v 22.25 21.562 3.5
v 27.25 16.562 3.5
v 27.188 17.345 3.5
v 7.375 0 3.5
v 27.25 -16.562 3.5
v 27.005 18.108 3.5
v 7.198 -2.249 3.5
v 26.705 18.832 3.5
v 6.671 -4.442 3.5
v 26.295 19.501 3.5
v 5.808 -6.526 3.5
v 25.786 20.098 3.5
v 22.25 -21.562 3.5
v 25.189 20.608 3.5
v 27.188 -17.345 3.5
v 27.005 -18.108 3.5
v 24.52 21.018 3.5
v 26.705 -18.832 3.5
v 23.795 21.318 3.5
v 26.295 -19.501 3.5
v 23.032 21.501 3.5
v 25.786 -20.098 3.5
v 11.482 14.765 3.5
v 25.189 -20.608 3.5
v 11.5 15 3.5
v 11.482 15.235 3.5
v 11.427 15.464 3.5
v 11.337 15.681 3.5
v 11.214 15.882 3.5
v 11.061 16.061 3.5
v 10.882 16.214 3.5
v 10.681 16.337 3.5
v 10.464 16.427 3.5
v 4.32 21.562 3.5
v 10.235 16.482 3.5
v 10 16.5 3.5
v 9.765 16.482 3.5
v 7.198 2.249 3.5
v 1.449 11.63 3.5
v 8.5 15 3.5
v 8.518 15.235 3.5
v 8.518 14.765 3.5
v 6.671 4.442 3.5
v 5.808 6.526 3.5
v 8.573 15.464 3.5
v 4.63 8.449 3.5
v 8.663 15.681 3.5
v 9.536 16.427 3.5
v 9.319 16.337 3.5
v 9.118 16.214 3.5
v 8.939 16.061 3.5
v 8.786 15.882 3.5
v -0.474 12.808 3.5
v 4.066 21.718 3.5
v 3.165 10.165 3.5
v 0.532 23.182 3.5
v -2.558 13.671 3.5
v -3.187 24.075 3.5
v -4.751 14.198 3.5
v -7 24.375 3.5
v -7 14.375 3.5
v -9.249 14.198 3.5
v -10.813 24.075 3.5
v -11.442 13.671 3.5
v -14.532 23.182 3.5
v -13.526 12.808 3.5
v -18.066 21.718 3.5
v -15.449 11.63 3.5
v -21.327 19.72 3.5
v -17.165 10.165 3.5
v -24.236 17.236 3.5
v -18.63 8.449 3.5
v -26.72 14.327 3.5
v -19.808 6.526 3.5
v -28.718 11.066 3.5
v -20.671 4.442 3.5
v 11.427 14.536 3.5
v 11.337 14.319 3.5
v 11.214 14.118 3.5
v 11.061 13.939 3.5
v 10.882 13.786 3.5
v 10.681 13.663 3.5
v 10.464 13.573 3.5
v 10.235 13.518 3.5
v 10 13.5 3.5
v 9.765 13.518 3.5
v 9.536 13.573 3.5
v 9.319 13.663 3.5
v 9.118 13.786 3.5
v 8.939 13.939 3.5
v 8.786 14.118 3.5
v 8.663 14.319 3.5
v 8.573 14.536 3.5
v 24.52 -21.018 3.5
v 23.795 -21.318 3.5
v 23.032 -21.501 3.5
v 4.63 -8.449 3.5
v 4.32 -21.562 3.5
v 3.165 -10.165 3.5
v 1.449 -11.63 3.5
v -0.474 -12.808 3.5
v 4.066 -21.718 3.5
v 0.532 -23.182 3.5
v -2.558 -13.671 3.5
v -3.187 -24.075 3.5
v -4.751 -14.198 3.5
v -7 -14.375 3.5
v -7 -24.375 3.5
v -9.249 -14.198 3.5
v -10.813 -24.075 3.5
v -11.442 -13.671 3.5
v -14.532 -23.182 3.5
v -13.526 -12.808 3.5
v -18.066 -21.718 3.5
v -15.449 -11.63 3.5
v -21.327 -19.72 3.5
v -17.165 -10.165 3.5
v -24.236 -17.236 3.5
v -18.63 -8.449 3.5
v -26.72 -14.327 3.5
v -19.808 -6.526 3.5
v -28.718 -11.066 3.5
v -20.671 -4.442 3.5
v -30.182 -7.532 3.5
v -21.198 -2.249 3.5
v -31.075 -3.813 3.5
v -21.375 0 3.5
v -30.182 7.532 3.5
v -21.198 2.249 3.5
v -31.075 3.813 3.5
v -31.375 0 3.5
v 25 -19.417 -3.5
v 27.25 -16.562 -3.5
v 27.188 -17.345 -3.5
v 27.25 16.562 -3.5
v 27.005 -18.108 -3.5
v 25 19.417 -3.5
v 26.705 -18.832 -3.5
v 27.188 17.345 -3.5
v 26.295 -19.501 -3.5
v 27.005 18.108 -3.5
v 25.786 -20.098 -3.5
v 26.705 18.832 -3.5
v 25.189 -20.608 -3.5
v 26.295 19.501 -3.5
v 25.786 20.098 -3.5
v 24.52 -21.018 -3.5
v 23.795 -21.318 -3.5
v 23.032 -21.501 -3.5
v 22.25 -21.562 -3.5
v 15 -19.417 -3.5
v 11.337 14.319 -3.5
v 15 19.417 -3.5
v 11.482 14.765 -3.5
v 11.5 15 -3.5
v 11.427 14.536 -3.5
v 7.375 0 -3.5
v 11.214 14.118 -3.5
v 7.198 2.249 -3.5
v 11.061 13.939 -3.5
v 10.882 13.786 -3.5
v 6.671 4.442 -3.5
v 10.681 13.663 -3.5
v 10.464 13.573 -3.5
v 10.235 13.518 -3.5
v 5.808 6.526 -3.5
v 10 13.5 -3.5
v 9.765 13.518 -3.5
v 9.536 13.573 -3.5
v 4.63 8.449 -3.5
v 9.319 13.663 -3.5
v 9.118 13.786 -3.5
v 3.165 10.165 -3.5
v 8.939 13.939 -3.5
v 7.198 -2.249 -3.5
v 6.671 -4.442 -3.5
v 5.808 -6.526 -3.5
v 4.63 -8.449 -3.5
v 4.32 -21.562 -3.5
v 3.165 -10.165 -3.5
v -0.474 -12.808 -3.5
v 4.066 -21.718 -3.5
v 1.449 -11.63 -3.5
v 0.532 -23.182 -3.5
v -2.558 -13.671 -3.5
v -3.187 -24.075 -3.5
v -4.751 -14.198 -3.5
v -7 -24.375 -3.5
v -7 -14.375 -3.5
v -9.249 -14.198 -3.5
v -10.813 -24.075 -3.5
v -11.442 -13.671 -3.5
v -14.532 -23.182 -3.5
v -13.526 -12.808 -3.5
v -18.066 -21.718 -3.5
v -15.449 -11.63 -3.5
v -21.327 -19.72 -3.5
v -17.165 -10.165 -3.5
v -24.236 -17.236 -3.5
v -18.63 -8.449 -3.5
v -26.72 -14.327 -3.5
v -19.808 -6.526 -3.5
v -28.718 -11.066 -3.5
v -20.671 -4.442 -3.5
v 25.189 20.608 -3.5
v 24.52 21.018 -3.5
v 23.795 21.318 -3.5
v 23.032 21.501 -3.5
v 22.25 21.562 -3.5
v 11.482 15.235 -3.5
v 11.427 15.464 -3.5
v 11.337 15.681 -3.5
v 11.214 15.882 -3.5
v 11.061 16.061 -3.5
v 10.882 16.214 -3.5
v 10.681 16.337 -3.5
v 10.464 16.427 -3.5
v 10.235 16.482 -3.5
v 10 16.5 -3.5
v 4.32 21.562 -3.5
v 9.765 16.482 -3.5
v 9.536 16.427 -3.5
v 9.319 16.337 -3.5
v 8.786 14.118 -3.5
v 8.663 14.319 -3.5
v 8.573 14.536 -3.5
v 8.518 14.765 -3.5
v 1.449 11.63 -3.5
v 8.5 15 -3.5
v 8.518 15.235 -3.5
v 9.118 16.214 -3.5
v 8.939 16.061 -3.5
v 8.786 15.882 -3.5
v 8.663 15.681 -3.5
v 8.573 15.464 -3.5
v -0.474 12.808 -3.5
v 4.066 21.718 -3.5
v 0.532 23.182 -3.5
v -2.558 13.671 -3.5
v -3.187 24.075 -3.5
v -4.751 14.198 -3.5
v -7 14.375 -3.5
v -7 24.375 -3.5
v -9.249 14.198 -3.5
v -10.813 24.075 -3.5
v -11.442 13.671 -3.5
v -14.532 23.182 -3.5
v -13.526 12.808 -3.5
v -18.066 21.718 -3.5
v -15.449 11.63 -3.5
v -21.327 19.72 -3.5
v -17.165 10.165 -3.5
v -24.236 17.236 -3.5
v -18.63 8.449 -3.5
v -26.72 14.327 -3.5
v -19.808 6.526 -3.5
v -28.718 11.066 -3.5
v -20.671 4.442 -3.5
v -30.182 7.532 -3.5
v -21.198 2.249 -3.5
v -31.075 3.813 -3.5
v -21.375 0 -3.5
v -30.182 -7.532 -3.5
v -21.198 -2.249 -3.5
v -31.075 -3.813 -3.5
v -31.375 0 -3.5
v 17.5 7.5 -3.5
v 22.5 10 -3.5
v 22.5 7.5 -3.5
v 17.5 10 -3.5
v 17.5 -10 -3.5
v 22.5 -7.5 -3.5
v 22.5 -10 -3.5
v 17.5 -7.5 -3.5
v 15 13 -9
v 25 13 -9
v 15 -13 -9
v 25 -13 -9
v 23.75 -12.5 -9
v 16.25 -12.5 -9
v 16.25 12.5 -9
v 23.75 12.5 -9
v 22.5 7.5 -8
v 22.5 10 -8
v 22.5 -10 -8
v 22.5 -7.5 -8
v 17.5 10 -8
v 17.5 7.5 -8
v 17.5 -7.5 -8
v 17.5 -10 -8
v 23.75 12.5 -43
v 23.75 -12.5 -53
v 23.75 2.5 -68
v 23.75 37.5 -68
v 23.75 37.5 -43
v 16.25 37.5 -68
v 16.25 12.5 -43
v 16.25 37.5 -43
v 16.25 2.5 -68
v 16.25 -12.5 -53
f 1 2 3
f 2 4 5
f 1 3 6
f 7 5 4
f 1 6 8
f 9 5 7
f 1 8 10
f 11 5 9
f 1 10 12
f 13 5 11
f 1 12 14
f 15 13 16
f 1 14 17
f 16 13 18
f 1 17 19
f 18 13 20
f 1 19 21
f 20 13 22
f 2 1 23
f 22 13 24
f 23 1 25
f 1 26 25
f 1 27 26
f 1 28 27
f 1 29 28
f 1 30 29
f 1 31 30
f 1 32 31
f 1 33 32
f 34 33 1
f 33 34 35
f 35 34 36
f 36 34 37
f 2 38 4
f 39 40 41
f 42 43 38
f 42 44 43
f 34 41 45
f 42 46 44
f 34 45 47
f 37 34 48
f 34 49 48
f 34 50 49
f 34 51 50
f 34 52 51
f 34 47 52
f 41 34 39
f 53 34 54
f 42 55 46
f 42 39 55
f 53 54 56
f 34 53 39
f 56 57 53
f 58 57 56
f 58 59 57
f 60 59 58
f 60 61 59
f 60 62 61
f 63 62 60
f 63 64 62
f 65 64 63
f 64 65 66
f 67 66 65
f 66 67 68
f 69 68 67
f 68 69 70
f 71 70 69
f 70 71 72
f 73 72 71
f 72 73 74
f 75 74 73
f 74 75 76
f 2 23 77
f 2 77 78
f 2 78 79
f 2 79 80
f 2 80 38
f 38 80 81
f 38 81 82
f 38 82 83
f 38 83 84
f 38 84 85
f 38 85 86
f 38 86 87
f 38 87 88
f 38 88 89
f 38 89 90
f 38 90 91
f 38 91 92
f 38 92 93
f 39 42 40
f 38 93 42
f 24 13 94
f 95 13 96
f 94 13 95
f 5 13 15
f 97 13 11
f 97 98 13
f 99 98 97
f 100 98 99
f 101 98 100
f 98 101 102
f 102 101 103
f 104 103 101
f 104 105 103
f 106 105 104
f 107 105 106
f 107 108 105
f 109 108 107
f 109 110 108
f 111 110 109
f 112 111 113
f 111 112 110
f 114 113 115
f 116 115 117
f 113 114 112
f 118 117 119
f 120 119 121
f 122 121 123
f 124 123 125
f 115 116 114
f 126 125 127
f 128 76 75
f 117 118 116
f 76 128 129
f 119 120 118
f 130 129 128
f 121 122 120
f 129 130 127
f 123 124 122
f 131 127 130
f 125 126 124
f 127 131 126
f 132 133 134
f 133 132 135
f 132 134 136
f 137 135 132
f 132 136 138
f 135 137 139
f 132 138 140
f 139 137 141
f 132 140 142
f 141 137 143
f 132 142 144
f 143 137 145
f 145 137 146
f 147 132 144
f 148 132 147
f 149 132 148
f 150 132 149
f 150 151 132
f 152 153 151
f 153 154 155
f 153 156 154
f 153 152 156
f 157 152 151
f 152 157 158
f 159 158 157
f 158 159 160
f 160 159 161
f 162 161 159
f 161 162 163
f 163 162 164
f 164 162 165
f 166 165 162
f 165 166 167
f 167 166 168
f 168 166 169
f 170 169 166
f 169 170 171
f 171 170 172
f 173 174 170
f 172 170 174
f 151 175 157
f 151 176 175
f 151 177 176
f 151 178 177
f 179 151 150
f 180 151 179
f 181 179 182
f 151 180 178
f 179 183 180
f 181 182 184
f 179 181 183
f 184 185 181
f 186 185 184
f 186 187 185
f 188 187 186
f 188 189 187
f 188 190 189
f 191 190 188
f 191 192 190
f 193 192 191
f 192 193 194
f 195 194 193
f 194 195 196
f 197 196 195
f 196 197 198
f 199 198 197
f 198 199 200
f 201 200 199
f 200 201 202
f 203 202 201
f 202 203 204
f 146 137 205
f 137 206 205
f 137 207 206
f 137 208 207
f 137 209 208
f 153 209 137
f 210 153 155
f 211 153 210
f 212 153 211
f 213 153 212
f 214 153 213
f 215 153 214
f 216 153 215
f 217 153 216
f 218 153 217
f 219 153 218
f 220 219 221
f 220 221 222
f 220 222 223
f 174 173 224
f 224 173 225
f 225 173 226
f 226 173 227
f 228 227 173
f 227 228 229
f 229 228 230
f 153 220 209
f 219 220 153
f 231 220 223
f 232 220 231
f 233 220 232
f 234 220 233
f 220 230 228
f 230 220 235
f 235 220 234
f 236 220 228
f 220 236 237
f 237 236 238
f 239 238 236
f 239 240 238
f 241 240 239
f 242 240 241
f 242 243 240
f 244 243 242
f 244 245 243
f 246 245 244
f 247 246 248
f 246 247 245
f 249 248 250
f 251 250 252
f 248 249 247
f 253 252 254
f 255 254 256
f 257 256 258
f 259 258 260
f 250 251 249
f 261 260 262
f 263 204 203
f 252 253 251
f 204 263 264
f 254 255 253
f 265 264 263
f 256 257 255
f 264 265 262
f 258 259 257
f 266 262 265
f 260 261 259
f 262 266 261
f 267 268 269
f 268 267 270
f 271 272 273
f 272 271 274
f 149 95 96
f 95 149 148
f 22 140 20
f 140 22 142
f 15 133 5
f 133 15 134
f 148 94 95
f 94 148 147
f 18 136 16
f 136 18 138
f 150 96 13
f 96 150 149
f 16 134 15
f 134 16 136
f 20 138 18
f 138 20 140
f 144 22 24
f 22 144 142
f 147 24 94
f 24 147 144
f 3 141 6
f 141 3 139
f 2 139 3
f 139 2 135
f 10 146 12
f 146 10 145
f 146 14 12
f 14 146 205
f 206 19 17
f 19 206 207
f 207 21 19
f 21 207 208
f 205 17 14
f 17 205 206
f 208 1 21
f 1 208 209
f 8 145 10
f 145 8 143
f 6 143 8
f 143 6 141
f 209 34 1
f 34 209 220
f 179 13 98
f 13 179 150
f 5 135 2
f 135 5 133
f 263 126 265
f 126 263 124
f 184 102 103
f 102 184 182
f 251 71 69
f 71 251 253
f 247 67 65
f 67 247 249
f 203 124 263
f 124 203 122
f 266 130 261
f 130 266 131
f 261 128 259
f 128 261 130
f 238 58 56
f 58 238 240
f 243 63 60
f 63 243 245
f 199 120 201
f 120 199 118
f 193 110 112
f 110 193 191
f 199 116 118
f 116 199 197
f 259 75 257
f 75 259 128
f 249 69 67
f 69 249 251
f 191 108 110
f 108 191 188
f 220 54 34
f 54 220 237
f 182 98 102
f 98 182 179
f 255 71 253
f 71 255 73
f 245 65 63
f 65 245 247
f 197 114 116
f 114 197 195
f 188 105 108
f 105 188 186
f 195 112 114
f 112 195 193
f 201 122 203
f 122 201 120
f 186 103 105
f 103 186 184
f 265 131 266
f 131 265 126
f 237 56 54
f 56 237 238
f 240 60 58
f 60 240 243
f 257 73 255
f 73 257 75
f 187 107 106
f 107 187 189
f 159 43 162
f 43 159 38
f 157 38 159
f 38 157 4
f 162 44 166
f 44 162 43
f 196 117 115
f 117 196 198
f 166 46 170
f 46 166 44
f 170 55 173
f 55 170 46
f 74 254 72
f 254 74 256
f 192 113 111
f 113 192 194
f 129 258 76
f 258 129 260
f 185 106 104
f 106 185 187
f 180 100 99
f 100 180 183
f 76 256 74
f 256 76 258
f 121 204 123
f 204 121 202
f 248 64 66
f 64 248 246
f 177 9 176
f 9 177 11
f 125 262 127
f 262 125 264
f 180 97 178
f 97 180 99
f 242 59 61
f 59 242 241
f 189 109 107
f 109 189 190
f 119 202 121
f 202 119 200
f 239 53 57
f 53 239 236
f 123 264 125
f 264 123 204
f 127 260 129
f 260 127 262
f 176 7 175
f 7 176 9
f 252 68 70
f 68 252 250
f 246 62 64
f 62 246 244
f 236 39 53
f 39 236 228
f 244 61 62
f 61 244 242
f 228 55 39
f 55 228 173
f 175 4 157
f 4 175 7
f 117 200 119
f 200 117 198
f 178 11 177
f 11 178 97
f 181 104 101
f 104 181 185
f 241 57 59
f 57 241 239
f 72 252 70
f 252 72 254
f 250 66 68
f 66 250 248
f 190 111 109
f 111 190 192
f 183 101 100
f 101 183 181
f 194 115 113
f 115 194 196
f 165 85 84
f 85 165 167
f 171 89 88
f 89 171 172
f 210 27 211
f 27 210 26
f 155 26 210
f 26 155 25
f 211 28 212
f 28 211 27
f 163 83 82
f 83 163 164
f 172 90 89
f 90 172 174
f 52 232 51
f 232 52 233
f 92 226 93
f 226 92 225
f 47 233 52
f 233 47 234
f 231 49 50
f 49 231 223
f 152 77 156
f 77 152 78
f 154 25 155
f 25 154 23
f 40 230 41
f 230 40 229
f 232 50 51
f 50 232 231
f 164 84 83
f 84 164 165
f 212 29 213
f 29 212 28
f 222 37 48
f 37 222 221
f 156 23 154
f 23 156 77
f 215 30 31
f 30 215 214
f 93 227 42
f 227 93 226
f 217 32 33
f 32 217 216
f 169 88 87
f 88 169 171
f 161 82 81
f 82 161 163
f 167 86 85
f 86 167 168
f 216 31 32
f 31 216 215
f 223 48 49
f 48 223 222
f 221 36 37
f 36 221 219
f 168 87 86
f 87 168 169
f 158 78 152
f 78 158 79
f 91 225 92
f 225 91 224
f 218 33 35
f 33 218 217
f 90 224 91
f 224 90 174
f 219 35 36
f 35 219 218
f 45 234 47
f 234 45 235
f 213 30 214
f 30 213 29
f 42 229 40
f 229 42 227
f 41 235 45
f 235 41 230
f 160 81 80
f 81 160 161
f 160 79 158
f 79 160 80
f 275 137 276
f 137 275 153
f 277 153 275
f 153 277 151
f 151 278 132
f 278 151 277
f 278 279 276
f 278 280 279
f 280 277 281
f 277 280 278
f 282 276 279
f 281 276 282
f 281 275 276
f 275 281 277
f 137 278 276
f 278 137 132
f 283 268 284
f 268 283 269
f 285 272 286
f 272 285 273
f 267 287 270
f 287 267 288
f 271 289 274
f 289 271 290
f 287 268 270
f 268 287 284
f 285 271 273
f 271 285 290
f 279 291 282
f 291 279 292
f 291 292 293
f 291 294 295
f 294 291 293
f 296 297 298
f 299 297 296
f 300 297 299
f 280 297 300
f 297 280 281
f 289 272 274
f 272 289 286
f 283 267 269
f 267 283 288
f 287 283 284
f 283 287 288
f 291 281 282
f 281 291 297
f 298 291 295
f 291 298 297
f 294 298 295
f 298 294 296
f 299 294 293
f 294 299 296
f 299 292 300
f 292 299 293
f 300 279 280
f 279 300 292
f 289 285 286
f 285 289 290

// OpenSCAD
$fn = 40;

use <MCAD/boxes.scad>;

module plate() {
    DIAMETER = 28.75;
    HEIGHT = 7;

    difference() {
        //roundedBox([60, 45, HEIGHT], 5, true);
        //hull() {
        union() {
            translate([-7, 0, - HEIGHT / 2]) {
                cylinder(r = DIAMETER / 2 + 10, h = HEIGHT);
            }

            //roundedBox([60, 45, HEIGHT], 5, true);
            translate([10, 0, 0]) {
                roundedBox([DIAMETER * 1.2, DIAMETER * 1.5, HEIGHT], 5, true);
            }
        }

        // Main hole
        translate([-7, 0, - HEIGHT]) {
            cylinder(r = DIAMETER / 2, h = HEIGHT * 2);
        }

        // Led
        translate([10, 15, - HEIGHT]) {
            cylinder(r = 1.5, h = HEIGHT * 2);
        }
    }
}

module support() {

    difference() {
        translate([25, 0, -3]) {
            rotate([-90, 0, 90])
            linear_extrude(height = 10) {
                polygon([[-13,6],[13,6],[20,0],[-20,0]]);
            }
        }

        // Clamp
        translate([20, 0, 0]) {
            cube(size = [5, 20, 30], center = true);
        }
    }
}

module arm() {

    scale([5, 5, 5])
    linear_extrude(height = 1.5) {
        polygon([[0,0],[-7,0],[-10,3],[-10,10],[-5,10],[-5,5],[2,5],[2,4],[3,4],[3,1],[2,1],[2,0]]);
    }
}

module main() {
    plate();
    support();

    translate([23.75, -12.5, -18]) {
        rotate([0, -90, 0]) {
            arm();
        }
    }
}

main();
